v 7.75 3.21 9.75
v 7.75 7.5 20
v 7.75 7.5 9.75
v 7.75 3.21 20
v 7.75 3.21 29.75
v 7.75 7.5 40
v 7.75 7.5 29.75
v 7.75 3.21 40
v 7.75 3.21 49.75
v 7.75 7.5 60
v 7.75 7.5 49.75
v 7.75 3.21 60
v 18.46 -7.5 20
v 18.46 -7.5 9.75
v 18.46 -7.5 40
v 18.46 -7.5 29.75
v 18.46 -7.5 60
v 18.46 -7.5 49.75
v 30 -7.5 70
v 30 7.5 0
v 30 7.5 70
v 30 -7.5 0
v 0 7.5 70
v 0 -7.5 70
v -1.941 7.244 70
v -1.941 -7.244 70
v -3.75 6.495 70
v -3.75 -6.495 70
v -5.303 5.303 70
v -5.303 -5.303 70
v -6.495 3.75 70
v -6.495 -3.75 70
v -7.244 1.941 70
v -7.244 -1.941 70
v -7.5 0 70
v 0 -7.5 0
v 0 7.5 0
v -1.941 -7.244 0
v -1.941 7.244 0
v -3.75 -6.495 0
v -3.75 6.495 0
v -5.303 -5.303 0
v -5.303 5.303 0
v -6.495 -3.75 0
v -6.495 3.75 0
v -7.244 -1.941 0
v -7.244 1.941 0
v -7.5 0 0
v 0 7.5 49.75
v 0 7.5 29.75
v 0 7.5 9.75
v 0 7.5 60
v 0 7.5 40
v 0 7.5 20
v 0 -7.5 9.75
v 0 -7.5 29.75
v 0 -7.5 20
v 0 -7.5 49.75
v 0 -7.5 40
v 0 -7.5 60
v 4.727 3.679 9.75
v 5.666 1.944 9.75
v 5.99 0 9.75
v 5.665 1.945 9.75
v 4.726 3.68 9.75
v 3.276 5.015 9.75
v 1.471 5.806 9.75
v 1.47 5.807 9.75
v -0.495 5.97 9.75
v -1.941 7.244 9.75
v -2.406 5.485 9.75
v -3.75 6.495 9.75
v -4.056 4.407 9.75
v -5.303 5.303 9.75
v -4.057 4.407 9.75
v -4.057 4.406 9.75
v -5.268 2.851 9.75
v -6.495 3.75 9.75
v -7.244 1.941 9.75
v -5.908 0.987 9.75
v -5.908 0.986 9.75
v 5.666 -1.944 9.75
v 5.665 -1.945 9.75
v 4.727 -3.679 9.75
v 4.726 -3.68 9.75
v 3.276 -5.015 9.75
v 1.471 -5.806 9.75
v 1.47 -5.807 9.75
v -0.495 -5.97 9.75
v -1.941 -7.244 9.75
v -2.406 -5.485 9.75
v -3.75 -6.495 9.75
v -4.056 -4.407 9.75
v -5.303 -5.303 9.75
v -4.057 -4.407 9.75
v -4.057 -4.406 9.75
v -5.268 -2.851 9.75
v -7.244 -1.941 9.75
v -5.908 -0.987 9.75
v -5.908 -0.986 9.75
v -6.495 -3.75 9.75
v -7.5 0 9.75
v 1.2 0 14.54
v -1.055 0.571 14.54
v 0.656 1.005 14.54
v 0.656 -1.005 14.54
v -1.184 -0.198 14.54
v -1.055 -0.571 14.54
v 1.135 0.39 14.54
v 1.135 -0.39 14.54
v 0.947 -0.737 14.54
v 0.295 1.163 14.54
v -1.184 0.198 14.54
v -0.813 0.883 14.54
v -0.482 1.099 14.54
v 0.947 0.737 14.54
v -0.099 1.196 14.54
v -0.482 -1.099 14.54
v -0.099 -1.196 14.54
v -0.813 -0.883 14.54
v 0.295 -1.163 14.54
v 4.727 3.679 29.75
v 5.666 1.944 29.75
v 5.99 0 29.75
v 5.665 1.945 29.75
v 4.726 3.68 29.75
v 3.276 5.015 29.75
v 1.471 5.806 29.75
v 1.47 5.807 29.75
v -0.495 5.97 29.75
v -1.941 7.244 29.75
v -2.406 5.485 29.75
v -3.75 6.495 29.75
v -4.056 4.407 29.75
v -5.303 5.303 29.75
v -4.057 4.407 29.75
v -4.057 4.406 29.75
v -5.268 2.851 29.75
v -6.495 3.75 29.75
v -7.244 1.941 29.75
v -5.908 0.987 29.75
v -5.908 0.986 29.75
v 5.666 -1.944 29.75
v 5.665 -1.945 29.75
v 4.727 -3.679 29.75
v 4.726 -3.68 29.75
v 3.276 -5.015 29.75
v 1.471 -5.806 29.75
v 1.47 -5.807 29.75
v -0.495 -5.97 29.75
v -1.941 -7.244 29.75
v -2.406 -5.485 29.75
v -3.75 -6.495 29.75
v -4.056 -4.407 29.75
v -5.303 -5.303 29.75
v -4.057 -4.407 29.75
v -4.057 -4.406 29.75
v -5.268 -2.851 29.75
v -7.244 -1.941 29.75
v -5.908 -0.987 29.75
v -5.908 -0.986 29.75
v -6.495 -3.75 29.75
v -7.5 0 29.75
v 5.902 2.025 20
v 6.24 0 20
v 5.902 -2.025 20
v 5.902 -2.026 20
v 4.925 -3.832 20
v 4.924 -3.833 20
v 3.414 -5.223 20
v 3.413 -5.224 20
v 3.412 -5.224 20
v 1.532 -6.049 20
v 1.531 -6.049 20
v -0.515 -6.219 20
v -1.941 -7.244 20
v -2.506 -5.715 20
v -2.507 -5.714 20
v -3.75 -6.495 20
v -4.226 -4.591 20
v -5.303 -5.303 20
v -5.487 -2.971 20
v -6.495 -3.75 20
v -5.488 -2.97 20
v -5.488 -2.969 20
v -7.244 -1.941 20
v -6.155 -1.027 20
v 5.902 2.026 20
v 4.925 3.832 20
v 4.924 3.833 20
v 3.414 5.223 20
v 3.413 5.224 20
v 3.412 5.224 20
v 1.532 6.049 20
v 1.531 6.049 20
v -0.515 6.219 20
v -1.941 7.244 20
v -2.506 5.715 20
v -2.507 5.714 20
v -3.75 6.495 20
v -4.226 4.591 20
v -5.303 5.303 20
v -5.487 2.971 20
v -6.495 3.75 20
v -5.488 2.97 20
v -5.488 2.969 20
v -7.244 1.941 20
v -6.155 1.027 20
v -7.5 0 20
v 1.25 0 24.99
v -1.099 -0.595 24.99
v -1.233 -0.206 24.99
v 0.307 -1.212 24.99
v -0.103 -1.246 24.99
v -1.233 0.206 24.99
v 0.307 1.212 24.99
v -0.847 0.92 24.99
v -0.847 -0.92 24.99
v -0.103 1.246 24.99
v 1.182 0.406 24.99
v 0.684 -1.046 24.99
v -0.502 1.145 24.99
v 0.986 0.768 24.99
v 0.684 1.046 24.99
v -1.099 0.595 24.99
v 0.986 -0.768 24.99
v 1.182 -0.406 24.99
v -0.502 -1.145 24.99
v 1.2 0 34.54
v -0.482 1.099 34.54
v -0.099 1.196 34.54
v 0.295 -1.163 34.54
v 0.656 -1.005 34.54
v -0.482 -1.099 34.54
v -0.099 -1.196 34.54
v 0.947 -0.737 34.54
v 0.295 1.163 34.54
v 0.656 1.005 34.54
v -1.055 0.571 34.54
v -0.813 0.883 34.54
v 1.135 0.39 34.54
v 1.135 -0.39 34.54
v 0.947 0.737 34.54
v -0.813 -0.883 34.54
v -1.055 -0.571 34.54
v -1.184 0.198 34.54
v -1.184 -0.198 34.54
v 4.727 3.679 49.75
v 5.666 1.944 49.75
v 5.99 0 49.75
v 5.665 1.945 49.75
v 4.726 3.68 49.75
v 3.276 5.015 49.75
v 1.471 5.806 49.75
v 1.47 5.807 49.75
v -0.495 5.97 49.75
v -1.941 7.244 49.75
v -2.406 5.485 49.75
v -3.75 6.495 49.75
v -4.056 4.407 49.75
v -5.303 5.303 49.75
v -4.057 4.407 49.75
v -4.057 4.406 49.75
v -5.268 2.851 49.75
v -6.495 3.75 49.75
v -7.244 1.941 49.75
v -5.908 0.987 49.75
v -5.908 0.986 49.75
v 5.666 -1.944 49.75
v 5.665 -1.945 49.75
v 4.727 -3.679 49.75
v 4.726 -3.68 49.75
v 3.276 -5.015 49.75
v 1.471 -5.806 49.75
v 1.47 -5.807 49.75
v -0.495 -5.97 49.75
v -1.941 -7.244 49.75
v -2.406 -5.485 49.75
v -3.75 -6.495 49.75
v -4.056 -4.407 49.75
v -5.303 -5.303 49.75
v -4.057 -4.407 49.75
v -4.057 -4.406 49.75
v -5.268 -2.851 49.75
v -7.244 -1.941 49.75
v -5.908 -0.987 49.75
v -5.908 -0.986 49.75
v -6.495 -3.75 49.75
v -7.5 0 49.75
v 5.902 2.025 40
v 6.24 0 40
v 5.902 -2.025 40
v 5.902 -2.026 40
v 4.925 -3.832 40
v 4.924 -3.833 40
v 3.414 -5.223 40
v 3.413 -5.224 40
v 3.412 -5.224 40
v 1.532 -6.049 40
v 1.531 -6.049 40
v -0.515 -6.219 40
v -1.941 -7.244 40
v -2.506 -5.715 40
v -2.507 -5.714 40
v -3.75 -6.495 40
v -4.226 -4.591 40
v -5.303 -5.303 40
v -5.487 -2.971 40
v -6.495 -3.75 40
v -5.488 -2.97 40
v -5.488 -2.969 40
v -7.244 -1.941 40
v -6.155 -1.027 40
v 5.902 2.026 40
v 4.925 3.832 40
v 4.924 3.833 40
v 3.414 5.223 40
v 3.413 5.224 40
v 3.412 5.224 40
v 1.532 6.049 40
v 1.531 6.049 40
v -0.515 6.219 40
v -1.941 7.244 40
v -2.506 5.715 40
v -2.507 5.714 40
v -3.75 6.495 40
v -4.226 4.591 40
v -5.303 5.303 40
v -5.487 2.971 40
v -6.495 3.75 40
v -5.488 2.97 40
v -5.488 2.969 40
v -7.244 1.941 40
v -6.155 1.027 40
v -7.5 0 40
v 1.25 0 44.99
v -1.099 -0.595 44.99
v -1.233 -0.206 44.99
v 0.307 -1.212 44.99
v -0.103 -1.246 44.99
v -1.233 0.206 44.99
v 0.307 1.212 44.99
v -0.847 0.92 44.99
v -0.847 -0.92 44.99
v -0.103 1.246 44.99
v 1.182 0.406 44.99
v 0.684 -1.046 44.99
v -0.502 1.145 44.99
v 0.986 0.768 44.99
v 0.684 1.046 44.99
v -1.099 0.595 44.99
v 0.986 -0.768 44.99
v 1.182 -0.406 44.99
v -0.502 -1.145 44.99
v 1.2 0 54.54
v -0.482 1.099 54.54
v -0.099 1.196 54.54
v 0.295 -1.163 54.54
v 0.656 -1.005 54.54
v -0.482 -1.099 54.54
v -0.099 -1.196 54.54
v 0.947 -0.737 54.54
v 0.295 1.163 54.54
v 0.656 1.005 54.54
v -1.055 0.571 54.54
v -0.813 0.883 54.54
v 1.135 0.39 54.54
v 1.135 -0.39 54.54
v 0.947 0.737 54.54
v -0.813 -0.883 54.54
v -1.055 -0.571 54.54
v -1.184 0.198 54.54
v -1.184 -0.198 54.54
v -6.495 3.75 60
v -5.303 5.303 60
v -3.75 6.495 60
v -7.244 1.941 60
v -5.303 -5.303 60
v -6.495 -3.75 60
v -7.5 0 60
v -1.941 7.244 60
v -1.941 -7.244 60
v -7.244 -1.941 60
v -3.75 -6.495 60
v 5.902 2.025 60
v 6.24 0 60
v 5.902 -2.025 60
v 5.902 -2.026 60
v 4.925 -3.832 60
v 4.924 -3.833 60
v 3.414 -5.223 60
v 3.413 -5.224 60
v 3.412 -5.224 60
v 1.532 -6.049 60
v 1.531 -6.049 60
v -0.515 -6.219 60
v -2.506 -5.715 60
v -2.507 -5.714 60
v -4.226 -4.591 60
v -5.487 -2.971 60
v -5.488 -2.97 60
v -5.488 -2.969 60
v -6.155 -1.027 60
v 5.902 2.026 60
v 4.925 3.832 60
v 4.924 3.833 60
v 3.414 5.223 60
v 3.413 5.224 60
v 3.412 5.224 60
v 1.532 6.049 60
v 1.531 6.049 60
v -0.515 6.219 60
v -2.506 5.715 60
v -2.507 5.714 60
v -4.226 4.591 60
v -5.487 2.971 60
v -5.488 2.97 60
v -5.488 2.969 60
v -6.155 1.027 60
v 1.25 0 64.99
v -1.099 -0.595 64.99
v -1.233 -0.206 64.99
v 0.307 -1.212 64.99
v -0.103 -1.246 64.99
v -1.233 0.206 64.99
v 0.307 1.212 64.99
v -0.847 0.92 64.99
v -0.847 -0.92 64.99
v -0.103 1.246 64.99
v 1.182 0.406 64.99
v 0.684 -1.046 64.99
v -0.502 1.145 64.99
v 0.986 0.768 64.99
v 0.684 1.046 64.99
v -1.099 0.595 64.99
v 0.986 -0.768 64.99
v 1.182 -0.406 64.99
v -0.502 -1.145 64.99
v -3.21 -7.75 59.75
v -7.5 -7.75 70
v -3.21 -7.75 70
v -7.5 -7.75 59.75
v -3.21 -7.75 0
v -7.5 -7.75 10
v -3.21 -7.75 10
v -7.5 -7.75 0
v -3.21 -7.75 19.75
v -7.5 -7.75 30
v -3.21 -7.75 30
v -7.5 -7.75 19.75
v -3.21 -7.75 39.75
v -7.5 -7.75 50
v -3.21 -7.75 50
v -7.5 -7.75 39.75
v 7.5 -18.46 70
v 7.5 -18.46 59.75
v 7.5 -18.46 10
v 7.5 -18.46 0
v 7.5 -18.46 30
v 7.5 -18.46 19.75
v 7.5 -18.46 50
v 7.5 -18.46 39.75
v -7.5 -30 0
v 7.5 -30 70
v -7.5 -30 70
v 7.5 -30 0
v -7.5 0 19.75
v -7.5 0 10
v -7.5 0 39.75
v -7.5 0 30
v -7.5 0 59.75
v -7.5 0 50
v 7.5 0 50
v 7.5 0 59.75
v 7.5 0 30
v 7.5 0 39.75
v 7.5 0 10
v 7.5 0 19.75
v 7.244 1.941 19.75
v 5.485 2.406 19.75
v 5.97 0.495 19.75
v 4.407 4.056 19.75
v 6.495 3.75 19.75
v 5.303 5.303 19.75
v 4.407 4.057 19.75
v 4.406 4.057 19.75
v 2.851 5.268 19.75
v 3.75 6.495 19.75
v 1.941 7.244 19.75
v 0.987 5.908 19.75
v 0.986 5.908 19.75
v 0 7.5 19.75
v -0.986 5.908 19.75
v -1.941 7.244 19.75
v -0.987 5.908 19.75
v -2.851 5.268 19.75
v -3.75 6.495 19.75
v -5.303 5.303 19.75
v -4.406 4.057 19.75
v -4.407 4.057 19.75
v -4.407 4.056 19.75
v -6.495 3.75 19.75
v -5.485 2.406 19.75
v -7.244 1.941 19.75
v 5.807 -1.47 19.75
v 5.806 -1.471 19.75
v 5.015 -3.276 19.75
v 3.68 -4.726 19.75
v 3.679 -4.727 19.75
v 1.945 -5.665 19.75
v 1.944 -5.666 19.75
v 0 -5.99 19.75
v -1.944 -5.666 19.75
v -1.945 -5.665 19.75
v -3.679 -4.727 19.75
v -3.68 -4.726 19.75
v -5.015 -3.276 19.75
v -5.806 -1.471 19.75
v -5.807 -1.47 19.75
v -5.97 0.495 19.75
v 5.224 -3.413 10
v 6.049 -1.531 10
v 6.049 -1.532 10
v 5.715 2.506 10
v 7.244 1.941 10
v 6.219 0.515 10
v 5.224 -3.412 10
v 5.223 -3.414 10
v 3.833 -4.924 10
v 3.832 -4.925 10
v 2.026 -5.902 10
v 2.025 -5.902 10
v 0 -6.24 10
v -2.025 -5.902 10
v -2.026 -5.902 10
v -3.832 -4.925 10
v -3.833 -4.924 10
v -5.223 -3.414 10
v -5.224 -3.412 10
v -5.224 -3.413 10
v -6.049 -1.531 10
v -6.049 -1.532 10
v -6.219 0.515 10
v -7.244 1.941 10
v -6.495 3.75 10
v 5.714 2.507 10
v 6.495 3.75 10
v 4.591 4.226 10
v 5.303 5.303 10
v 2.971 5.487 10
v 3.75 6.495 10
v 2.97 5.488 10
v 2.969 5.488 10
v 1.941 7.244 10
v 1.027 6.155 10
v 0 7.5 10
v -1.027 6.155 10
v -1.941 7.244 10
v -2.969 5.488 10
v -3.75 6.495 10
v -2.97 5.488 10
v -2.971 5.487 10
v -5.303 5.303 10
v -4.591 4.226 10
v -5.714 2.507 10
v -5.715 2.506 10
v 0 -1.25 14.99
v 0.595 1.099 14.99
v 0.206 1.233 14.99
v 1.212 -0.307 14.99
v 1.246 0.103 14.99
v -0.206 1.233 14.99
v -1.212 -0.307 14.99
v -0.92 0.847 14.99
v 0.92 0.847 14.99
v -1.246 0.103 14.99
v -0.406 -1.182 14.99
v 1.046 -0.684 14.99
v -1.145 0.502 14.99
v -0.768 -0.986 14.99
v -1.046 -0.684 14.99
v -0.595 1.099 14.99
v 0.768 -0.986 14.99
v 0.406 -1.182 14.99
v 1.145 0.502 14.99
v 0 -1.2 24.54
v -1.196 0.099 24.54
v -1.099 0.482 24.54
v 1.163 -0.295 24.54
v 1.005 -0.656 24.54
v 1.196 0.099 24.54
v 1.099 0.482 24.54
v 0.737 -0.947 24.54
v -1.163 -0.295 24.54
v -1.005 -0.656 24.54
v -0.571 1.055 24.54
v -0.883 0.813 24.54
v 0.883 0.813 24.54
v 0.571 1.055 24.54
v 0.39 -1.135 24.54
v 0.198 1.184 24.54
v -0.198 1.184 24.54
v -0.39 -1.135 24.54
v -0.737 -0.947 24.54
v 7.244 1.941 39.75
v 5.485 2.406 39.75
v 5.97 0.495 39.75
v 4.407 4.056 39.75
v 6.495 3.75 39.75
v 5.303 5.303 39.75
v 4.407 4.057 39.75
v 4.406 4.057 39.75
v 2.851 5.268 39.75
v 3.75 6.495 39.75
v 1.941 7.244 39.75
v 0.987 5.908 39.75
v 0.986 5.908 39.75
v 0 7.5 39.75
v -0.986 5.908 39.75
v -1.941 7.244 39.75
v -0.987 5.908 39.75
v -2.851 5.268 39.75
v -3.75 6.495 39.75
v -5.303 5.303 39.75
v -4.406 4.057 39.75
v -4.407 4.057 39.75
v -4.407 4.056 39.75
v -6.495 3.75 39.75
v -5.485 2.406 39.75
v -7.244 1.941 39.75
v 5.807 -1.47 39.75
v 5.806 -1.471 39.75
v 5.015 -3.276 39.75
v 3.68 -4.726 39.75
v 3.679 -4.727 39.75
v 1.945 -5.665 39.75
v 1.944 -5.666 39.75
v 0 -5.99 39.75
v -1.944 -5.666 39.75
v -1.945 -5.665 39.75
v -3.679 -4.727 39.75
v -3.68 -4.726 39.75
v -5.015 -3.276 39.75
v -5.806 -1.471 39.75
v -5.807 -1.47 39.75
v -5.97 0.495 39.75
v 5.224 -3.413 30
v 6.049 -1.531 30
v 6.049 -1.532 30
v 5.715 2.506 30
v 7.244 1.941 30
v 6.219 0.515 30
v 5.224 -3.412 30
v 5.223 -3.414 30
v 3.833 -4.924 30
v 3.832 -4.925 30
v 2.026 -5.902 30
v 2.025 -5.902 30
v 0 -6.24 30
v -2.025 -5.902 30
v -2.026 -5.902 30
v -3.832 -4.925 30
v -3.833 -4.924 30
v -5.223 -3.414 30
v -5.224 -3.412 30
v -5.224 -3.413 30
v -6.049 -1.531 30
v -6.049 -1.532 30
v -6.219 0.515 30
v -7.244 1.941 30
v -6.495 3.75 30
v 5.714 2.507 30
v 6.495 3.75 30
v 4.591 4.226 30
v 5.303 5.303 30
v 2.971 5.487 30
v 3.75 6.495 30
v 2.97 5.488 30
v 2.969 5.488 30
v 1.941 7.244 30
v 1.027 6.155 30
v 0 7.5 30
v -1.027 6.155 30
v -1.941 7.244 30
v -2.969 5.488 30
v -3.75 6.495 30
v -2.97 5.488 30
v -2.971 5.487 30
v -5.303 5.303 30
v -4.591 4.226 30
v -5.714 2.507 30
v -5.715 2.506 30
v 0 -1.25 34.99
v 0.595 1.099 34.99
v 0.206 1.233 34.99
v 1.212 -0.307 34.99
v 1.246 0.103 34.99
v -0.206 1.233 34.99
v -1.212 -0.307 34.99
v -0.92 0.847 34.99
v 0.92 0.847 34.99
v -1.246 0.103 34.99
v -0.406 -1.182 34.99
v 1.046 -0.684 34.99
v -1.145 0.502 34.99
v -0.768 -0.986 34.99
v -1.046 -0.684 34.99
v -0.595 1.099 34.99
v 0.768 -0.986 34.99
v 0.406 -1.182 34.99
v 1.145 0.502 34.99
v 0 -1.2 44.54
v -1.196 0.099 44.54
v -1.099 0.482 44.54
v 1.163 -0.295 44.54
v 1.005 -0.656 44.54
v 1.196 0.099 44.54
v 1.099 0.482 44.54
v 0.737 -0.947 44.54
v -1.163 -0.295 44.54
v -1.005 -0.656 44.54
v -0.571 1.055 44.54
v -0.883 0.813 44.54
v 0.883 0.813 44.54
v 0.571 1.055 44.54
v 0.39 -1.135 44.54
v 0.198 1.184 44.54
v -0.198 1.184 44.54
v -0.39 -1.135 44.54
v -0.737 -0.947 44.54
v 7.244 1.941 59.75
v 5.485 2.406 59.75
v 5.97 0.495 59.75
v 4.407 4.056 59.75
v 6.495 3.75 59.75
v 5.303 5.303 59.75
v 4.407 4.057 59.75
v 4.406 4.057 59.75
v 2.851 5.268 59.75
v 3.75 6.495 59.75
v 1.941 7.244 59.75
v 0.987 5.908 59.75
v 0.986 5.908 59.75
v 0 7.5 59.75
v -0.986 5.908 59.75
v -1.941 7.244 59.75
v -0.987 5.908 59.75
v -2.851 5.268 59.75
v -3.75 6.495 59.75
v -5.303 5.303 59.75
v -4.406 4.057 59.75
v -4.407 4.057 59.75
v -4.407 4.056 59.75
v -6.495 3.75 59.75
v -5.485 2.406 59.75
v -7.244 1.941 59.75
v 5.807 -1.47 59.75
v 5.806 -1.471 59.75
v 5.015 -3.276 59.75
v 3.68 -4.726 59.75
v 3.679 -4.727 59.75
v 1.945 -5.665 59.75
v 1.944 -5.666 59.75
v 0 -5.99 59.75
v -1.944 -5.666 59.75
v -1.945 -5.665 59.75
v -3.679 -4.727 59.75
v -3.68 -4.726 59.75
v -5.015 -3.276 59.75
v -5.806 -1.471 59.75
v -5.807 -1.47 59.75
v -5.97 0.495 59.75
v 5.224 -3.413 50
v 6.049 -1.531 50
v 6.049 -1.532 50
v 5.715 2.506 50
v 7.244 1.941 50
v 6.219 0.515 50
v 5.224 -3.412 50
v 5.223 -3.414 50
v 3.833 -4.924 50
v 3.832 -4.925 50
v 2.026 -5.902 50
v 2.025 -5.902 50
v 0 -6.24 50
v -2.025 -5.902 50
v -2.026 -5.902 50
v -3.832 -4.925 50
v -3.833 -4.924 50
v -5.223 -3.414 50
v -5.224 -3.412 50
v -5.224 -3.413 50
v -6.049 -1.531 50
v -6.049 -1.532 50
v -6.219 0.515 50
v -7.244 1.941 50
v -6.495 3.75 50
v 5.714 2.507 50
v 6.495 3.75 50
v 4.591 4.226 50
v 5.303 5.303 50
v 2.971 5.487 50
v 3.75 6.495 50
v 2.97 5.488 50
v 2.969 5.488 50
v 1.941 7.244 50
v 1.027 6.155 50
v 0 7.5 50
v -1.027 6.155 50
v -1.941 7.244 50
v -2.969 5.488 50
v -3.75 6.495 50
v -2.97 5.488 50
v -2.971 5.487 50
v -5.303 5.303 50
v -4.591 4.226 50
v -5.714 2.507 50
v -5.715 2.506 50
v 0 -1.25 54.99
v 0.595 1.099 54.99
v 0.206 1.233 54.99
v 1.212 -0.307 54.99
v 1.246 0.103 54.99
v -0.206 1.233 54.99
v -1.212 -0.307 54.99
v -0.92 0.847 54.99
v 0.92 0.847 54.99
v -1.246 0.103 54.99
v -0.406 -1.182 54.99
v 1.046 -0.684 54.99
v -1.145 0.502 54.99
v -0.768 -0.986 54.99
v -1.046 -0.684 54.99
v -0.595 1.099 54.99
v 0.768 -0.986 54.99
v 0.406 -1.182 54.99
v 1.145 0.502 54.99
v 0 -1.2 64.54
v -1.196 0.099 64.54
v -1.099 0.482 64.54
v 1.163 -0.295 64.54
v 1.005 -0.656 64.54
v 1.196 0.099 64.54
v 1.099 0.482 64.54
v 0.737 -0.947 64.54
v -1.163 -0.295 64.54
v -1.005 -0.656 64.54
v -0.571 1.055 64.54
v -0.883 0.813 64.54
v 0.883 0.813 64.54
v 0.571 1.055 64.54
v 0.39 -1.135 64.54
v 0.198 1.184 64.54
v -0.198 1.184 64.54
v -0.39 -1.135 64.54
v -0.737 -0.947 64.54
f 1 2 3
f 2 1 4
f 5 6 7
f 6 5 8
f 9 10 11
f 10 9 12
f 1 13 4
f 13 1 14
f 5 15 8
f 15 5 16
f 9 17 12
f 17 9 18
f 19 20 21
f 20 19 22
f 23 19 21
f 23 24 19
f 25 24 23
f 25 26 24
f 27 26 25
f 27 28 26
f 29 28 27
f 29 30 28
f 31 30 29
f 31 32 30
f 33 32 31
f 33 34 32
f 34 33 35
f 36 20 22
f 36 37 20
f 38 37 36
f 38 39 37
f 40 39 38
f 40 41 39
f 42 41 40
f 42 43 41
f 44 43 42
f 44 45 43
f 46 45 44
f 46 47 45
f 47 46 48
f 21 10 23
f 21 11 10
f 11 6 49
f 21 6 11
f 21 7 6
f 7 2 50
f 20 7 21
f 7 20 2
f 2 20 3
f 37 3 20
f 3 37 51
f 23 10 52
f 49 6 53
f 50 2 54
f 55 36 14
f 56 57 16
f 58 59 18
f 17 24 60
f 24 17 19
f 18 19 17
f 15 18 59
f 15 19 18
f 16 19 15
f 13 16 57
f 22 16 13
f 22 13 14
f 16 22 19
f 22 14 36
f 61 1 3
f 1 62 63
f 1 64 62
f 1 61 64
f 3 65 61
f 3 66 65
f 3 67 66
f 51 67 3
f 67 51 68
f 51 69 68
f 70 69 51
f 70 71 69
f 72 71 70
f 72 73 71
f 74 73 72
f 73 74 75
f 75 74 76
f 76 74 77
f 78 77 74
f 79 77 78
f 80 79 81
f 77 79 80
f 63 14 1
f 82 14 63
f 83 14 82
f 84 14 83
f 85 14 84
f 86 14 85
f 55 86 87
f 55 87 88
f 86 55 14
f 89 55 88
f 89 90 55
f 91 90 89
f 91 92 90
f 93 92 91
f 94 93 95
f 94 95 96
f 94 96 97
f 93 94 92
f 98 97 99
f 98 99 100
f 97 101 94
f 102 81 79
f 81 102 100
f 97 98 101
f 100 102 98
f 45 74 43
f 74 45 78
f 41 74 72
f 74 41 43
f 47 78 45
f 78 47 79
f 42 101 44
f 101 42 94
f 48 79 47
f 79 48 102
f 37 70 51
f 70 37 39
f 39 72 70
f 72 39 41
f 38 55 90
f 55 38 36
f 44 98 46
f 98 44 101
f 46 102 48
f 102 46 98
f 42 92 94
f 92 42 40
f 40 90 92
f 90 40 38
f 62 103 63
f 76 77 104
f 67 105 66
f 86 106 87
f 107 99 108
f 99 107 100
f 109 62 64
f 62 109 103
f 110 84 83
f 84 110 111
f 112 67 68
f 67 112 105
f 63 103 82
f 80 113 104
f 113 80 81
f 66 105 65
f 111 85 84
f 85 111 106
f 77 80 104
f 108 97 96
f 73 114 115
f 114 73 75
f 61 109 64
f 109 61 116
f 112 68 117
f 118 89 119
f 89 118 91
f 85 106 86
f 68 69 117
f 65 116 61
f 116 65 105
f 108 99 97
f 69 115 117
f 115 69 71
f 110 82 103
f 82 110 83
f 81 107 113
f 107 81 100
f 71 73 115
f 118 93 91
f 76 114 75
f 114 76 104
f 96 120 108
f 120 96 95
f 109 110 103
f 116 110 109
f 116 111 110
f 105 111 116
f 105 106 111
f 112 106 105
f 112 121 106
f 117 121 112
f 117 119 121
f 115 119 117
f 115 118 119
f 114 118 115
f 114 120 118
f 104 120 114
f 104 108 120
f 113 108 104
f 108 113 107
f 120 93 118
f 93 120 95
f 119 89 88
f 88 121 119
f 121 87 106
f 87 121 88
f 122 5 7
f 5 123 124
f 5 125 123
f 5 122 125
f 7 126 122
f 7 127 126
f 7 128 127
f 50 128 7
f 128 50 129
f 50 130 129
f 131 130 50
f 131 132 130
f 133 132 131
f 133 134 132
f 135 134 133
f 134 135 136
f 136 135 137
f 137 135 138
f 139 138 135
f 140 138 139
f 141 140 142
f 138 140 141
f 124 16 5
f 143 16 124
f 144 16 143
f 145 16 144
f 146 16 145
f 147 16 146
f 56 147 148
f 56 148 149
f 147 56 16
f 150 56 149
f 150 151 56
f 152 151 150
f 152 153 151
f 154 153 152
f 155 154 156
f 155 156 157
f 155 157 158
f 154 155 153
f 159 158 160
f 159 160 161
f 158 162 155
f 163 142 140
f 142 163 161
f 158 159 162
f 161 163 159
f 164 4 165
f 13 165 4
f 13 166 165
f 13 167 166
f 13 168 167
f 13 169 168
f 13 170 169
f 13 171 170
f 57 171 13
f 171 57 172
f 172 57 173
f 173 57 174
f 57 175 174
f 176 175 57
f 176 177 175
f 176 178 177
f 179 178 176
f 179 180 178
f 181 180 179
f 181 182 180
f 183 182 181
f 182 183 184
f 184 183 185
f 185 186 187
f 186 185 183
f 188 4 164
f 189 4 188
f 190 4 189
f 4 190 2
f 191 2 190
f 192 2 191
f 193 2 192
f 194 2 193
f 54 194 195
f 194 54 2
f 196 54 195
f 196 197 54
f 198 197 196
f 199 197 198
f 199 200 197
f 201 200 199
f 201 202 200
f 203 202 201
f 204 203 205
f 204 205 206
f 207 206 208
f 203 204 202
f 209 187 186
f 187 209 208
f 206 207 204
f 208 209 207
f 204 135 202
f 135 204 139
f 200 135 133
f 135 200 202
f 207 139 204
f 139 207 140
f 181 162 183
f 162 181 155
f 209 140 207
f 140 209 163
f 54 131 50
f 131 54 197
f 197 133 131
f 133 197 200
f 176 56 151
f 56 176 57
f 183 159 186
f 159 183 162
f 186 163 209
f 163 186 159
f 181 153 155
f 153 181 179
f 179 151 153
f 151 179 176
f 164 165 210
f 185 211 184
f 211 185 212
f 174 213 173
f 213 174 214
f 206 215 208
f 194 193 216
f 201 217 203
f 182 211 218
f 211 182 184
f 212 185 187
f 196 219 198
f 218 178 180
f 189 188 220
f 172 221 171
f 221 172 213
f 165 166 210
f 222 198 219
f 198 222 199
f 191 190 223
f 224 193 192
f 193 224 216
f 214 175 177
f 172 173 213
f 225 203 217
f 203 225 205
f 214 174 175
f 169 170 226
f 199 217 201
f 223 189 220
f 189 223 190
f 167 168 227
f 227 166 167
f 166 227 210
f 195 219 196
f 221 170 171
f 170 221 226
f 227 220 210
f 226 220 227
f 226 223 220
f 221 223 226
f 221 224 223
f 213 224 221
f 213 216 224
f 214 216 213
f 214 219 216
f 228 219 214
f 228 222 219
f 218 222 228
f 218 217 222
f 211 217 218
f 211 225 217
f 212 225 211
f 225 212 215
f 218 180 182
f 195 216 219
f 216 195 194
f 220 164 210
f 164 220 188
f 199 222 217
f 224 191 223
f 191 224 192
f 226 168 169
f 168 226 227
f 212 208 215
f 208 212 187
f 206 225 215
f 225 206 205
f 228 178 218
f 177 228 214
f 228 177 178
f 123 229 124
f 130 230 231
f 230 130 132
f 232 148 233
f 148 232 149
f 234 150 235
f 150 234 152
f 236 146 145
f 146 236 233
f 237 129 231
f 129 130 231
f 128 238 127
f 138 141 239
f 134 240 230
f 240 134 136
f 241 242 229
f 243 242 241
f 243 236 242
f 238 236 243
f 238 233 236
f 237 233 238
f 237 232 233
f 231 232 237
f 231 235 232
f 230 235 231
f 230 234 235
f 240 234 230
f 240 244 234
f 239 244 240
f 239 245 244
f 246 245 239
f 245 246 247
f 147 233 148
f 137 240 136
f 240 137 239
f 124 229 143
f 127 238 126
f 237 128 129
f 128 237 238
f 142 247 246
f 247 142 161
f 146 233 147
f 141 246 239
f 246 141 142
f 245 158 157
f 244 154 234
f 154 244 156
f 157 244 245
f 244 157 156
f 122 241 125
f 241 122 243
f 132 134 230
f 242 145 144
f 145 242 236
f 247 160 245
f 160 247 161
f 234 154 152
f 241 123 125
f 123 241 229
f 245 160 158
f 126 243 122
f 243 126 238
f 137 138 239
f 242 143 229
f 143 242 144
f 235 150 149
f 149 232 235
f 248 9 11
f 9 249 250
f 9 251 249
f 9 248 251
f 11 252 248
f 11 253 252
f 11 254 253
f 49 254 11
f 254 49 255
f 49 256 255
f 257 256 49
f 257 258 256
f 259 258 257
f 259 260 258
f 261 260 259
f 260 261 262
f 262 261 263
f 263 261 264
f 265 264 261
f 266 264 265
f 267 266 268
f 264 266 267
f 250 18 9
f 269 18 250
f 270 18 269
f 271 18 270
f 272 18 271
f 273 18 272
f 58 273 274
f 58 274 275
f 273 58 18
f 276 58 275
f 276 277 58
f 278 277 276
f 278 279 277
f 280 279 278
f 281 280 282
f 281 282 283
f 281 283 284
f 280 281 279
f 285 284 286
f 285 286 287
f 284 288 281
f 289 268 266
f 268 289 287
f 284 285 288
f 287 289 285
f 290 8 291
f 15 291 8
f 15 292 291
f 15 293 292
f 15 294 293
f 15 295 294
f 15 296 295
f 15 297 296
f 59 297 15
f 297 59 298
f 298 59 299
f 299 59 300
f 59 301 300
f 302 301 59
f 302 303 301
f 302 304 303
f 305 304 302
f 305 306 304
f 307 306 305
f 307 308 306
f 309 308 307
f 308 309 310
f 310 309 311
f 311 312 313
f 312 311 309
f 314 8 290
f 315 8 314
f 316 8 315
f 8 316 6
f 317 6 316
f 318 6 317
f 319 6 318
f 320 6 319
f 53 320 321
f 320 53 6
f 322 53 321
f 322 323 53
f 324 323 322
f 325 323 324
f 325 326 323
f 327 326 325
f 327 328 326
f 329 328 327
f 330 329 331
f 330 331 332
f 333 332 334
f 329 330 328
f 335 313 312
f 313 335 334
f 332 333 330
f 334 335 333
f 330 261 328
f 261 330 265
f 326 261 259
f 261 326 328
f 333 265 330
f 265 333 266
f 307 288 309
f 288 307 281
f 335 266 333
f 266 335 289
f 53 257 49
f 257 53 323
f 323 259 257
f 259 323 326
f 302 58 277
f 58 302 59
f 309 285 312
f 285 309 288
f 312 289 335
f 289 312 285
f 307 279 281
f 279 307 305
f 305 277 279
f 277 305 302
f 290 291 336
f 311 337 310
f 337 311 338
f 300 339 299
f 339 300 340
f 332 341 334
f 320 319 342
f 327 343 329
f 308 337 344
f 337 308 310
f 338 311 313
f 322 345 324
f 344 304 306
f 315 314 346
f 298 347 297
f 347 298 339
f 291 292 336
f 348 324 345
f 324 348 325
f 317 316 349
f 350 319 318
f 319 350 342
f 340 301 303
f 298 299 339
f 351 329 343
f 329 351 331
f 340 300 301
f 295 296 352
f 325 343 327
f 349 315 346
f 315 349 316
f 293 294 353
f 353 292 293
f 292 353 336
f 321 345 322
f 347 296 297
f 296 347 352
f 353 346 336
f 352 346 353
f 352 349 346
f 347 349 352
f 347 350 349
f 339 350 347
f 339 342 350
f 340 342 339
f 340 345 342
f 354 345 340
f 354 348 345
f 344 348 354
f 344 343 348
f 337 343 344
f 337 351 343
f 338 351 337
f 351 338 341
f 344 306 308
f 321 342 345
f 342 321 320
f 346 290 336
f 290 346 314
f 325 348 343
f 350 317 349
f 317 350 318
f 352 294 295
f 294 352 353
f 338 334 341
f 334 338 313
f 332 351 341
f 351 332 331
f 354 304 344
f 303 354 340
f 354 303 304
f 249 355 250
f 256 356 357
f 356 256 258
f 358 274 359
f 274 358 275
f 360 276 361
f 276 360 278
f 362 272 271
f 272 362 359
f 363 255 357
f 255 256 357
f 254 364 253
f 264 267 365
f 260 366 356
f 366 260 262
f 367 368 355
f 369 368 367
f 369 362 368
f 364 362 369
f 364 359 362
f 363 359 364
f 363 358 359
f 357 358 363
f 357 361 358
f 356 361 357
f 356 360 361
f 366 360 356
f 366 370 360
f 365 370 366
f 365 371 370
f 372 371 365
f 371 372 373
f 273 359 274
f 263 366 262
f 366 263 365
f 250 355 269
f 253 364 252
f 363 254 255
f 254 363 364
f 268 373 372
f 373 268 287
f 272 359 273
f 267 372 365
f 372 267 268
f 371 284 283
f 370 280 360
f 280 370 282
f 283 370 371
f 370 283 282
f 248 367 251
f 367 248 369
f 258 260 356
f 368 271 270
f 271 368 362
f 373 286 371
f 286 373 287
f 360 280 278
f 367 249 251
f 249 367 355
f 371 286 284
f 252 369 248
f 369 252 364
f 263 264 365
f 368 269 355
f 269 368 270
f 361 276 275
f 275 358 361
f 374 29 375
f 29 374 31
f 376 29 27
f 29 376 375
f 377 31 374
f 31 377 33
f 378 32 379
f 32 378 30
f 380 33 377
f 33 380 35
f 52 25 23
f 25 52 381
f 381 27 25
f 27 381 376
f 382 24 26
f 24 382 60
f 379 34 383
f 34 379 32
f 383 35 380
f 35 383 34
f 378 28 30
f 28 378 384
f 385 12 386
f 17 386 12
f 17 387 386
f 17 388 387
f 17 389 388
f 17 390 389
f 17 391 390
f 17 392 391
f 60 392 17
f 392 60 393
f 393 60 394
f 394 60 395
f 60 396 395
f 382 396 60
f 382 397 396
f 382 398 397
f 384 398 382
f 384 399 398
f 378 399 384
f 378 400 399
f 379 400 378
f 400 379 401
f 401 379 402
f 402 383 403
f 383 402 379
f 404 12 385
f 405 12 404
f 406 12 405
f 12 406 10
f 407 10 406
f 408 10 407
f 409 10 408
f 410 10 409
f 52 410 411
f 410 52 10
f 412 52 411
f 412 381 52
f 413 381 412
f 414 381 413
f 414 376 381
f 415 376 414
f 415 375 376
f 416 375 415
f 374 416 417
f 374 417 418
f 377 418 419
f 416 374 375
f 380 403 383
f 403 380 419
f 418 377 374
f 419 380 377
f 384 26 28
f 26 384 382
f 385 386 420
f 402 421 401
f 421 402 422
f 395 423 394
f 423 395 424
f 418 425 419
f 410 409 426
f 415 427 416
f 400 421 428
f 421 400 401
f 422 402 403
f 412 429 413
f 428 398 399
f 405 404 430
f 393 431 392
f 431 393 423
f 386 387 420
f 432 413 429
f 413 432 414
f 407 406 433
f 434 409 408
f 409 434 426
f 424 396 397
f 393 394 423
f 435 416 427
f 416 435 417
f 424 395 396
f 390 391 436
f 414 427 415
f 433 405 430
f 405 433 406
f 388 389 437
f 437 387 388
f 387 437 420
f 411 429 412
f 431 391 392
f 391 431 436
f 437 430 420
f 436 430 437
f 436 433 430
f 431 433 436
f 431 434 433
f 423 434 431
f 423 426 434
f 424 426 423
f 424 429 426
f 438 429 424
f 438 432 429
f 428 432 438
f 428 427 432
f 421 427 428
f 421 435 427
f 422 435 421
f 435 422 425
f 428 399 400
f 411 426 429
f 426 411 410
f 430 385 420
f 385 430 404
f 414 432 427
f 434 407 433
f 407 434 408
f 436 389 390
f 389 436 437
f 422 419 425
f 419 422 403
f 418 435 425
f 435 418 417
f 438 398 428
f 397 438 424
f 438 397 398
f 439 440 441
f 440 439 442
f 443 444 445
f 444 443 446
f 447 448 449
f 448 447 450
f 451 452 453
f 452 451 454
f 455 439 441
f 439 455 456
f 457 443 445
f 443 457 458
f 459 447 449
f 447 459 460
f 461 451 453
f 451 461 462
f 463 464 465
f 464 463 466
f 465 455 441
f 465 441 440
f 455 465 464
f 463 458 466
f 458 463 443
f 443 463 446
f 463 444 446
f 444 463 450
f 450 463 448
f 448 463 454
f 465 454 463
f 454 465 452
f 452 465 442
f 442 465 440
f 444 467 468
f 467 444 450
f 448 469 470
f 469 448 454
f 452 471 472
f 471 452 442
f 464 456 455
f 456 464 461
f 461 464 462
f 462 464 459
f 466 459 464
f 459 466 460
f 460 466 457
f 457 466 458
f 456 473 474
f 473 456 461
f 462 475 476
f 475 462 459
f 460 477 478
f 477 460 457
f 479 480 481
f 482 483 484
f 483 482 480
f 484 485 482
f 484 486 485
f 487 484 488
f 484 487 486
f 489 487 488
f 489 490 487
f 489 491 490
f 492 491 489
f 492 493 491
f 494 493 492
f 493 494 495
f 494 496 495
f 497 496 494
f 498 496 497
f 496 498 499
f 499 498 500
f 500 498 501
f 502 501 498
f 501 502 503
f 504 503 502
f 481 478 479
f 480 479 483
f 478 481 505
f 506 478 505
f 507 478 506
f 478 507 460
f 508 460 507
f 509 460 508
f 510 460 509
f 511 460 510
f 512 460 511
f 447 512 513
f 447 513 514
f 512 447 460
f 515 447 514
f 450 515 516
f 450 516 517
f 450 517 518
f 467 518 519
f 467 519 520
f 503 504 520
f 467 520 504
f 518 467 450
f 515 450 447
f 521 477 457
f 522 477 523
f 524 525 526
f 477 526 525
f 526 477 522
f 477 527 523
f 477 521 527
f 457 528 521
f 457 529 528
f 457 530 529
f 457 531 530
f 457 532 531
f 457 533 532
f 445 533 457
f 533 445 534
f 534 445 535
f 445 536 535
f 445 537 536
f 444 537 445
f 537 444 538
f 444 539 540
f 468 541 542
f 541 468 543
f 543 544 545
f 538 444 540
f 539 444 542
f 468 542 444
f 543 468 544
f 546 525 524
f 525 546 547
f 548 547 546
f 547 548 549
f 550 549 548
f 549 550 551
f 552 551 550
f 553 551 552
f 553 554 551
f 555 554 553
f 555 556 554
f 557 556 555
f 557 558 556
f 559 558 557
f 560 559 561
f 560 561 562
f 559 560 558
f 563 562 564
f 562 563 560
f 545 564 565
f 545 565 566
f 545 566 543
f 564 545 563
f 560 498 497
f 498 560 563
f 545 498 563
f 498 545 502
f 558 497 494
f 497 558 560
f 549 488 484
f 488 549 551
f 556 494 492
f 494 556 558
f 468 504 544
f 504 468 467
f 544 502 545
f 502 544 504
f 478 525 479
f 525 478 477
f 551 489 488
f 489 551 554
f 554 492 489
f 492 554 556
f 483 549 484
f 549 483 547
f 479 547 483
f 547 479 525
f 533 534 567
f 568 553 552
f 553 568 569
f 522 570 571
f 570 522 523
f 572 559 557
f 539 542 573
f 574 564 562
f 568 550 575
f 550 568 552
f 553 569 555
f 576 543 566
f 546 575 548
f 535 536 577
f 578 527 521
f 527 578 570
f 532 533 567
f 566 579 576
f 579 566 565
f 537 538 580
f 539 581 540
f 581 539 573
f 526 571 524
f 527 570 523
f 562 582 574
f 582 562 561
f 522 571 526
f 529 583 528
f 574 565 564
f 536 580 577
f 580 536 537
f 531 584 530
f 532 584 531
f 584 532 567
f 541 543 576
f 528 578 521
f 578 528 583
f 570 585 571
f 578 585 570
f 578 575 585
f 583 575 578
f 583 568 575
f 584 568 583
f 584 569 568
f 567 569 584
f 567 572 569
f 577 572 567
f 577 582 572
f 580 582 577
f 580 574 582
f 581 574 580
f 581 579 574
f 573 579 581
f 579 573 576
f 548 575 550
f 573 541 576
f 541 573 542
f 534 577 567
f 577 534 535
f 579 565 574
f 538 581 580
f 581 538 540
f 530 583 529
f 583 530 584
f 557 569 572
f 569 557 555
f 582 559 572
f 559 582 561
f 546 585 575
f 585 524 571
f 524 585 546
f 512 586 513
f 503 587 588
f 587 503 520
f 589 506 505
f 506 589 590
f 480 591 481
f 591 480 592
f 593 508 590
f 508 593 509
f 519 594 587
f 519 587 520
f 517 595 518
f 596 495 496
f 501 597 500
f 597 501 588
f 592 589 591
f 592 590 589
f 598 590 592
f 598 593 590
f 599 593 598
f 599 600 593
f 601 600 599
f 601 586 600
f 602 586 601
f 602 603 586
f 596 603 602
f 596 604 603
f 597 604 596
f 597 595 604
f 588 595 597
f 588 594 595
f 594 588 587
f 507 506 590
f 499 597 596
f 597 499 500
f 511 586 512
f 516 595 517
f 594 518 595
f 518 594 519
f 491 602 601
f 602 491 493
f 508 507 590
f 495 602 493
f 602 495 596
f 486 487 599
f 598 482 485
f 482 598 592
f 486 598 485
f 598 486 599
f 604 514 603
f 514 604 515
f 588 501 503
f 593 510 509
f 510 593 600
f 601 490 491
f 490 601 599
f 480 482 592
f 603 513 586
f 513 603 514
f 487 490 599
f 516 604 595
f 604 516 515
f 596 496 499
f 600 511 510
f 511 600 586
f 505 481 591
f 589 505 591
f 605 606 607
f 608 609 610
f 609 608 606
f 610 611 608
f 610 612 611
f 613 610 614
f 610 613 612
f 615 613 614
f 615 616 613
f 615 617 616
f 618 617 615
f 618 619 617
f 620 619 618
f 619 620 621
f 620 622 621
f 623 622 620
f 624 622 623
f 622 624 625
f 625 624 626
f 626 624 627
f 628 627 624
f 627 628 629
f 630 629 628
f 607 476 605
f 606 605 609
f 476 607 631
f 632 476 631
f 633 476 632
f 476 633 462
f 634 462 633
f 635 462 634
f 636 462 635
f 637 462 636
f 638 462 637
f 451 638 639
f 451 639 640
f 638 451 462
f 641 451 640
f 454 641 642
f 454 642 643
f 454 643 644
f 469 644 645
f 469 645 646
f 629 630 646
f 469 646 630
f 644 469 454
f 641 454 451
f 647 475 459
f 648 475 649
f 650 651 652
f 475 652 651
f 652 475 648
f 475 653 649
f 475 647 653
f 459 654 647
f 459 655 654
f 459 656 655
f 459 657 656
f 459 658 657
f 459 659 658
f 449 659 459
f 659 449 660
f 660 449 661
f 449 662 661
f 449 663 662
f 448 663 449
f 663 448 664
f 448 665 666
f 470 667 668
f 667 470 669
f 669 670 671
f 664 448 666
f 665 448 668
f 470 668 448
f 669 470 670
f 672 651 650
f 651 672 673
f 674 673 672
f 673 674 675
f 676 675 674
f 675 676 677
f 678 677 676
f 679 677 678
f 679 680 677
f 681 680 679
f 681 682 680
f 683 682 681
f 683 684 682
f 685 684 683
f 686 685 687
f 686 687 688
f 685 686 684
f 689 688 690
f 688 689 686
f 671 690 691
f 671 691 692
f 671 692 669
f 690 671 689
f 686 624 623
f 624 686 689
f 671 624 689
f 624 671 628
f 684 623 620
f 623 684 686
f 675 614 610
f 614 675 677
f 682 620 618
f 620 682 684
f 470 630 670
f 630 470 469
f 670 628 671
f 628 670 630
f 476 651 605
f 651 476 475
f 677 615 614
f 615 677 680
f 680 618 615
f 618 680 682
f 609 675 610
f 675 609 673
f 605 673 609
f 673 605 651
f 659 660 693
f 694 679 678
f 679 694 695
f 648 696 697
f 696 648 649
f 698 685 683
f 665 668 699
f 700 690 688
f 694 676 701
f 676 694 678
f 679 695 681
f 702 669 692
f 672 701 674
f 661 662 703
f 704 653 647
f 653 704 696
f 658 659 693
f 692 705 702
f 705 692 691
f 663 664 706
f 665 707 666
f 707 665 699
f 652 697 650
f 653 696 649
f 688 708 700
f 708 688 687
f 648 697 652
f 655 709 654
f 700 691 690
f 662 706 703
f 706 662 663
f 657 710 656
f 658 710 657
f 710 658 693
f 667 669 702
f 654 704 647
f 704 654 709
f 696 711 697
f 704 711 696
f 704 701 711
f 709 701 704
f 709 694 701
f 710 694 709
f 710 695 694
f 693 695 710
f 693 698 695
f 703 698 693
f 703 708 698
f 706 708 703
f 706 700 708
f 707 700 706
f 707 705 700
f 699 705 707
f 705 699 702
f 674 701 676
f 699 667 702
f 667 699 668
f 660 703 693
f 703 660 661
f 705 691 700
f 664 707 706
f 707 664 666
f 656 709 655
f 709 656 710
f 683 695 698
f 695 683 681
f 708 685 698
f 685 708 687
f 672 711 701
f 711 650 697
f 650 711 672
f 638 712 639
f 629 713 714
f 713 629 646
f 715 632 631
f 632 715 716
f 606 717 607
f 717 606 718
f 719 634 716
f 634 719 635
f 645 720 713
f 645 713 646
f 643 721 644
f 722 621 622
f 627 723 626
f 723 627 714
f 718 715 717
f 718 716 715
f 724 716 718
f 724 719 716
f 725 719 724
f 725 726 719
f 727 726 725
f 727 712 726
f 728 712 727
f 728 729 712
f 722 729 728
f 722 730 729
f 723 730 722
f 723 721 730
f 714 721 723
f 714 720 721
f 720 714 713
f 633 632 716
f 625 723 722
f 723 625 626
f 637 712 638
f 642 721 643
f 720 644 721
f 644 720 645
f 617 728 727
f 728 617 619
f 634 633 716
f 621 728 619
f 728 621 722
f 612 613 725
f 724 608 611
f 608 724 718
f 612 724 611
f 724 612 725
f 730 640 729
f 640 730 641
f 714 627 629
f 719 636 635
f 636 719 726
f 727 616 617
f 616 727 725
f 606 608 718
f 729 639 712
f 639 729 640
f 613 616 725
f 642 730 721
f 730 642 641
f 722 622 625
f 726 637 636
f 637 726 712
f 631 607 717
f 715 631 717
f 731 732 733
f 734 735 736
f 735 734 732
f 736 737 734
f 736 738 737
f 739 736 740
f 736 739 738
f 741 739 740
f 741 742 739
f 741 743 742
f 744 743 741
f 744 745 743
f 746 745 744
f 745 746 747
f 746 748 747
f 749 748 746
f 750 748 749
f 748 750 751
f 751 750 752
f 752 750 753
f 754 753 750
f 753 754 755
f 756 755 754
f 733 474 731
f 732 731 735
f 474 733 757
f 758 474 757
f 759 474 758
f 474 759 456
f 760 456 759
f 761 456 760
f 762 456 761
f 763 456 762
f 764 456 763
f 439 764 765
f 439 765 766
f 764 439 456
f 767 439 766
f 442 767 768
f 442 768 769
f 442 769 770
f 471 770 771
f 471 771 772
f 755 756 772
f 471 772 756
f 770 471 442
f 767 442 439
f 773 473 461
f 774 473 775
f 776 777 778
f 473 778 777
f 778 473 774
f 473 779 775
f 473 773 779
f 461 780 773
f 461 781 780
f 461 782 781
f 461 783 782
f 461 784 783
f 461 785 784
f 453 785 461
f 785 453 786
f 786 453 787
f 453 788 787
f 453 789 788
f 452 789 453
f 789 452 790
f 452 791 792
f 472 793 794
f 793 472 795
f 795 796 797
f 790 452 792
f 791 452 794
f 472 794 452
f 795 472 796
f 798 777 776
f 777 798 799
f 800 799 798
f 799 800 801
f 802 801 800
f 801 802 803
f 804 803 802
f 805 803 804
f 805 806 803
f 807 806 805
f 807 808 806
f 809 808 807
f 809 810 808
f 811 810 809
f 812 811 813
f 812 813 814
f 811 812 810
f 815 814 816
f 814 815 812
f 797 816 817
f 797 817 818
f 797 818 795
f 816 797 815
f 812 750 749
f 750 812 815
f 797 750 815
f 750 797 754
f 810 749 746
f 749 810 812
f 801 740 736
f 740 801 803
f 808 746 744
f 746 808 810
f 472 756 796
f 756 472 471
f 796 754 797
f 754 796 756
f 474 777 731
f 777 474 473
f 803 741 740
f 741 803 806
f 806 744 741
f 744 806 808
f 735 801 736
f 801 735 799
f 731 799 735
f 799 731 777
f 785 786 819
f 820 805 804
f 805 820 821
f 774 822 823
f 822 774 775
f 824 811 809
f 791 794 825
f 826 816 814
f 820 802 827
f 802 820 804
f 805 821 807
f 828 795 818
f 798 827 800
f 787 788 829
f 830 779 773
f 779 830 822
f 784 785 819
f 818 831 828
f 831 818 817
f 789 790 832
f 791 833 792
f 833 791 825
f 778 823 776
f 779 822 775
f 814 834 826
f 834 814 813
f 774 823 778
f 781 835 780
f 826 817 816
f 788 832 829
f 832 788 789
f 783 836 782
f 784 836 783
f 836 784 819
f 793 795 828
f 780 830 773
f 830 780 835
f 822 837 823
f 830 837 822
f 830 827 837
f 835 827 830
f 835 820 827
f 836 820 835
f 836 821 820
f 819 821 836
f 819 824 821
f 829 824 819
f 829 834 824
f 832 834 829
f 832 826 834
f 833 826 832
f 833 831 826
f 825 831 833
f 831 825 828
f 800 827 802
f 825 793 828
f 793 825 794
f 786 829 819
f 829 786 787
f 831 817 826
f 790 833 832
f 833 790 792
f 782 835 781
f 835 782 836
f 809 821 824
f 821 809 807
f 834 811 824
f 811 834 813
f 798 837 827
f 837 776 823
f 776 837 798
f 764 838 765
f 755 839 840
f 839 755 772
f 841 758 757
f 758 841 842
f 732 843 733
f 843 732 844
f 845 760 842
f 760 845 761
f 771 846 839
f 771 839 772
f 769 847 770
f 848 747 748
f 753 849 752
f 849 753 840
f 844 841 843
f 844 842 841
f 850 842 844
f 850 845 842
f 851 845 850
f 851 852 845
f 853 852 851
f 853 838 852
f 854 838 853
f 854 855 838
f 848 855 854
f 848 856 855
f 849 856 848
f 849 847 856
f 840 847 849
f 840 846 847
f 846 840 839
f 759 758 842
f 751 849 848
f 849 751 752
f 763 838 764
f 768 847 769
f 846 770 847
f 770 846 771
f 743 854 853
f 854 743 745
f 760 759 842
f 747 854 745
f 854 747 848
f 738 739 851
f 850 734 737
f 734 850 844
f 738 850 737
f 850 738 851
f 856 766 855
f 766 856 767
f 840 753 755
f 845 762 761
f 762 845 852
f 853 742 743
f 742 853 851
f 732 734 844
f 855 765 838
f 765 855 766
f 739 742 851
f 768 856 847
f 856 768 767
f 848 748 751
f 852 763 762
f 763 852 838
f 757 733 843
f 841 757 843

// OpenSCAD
// file: components/pip_hinge.scad
module hinge(
	d,
	l, 
	tol, 
	max_angle_1=45, 
	max_angle_2=45, 
	angle=0
) {
	// all values besides the angle must be positive
	assert(d > 0, "Diameter must be positive");
	assert(l > 0, "Length must be positive");
	assert(tol >= 0, "Tolerance must be non-negative");
	assert(max_angle_1 >= 0, "Max angle 1 must be non-negative");
	assert(max_angle_2 >= 0, "Max angle 2 must be non-negative");
	// max angles must be 15 <= angle <= 180
	assert(max_angle_1 <= 180, "Max angle 1 must be <= 180");
	assert(max_angle_1 >= 15, "Max angle 1 must be >= 15");
	assert(max_angle_2 <= 180, "Max angle 2 must be <= 180");
	assert(max_angle_2 >= 15, "Max angle 2 must be >= 15");
	// single width is determined via the calc in "notes/Width calc.pdf"
	single_width = (16/25)*d;
	segments = floor(l / single_width);  // how many units fit in l
	width = l/segments; // the ideal single width (will need to pad to fit)
	pad_width = width-single_width;
	r = d/2;
	// function to create the interface cone
	module interface_cone(cone_tol=0) {
		// make it 45 degrees
		rise=single_width/2;
		r1 = (4/5)*r;
		r2 = r1-rise;
		// scale factor will be to get the desired tolerance
		scale_factor = (r1 + cone_tol) / r1;
		scale([scale_factor, scale_factor, scale_factor])
			cylinder(
				h=rise, 
				r1=r1, 
				r2=r2
			);
	}
	
	// function to create the "barrel" of the hinge (option to not have the 
	// male or female features)
	module barrel(suppress_female=false, suppress_male=false) {
		barrel_height = suppress_male ? width : width - tol;
		difference() {
			cylinder(h=barrel_height, r=r);
			if (!suppress_female) {
				translate([0, 0, -0.01])
					interface_cone(cone_tol=tol);
			}
		}
		if (!suppress_male) {
		        translate([0, 0, (barrel_height)-0.01])
				interface_cone();
		}
		difference() {
			translate([0, -d/2, 0])
				resize([2*d, d, barrel_height])
					cube();
			translate([0, 0, -0.01])
				cylinder(h=barrel_height+0.02, r=r-tol);
		}
	}
	// function to create the flange body
	module flange_body() {
		module flange_cutout() {
			barrel_cutout_d = d + 2*tol;
			cutout_l = l + 0.02;
			cylinder(h=cutout_l, r=barrel_cutout_d/2);
			// cutout for hinge body at first angle
			rotate([0, 0, max_angle_1])
				translate([0, -barrel_cutout_d/2, 0])
					resize([barrel_cutout_d*2, barrel_cutout_d, cutout_l])
						cube();
			// cutout for hinge body at second angle
			rotate([0, 0, -max_angle_2])
				translate([0, -barrel_cutout_d/2, 0])
					resize([barrel_cutout_d*2, barrel_cutout_d, cutout_l])
						cube();
		}
		difference() {
			translate([0, -d/2, 0])
				resize([d*2, d, l])
					cube();
			translate([0, 0, -0.01])
				flange_cutout();
		}
	}
	// function to create one side of the hinge
	module hinge_side(odd=false) {
		flange_body();
		for (i = [0 : segments-1]) {
			// if odd, skip odd iterations
			translate([0, 0, i*width])
			// skip if odd and even iteration
			// or if not odd and odd iteration
			if (
				(odd && (i % 2 == 1)) ||
				(!odd && (i % 2 == 0))
			) {
				if (i == segments-1)
					barrel(suppress_male=true);
				else if (i == 0)
					barrel(suppress_female=true);
				else
					barrel();
			}
		}
	}
	hinge_side(odd=false);
	rotate([0, 0, angle])
		mirror([1, 0, 0])
			hinge_side(odd=true);
}

module full_close_hinge(d,l, tol, max_open_angle=90, angle=0) {
	intersection() {
		union() {
			translate([-2*d, -d/2, 0])
				resize([4*d, d/2, l])
					cube();
			cylinder(h=l, r=d/2);
		}
		hinge(
			d=d, 
			l=l, 
			tol=tol, 
			max_angle_1=90,
			max_angle_2=max_open_angle, 
			angle=angle
		);
	}
}
// main file
use <components/pip_hinge.scad>


module hinge_example() {
	hinge(
		d=15, 
		l=70, 
		tol=0.25, 
		max_angle_1=90,
		angle=90
	);
}


hinge_example();
